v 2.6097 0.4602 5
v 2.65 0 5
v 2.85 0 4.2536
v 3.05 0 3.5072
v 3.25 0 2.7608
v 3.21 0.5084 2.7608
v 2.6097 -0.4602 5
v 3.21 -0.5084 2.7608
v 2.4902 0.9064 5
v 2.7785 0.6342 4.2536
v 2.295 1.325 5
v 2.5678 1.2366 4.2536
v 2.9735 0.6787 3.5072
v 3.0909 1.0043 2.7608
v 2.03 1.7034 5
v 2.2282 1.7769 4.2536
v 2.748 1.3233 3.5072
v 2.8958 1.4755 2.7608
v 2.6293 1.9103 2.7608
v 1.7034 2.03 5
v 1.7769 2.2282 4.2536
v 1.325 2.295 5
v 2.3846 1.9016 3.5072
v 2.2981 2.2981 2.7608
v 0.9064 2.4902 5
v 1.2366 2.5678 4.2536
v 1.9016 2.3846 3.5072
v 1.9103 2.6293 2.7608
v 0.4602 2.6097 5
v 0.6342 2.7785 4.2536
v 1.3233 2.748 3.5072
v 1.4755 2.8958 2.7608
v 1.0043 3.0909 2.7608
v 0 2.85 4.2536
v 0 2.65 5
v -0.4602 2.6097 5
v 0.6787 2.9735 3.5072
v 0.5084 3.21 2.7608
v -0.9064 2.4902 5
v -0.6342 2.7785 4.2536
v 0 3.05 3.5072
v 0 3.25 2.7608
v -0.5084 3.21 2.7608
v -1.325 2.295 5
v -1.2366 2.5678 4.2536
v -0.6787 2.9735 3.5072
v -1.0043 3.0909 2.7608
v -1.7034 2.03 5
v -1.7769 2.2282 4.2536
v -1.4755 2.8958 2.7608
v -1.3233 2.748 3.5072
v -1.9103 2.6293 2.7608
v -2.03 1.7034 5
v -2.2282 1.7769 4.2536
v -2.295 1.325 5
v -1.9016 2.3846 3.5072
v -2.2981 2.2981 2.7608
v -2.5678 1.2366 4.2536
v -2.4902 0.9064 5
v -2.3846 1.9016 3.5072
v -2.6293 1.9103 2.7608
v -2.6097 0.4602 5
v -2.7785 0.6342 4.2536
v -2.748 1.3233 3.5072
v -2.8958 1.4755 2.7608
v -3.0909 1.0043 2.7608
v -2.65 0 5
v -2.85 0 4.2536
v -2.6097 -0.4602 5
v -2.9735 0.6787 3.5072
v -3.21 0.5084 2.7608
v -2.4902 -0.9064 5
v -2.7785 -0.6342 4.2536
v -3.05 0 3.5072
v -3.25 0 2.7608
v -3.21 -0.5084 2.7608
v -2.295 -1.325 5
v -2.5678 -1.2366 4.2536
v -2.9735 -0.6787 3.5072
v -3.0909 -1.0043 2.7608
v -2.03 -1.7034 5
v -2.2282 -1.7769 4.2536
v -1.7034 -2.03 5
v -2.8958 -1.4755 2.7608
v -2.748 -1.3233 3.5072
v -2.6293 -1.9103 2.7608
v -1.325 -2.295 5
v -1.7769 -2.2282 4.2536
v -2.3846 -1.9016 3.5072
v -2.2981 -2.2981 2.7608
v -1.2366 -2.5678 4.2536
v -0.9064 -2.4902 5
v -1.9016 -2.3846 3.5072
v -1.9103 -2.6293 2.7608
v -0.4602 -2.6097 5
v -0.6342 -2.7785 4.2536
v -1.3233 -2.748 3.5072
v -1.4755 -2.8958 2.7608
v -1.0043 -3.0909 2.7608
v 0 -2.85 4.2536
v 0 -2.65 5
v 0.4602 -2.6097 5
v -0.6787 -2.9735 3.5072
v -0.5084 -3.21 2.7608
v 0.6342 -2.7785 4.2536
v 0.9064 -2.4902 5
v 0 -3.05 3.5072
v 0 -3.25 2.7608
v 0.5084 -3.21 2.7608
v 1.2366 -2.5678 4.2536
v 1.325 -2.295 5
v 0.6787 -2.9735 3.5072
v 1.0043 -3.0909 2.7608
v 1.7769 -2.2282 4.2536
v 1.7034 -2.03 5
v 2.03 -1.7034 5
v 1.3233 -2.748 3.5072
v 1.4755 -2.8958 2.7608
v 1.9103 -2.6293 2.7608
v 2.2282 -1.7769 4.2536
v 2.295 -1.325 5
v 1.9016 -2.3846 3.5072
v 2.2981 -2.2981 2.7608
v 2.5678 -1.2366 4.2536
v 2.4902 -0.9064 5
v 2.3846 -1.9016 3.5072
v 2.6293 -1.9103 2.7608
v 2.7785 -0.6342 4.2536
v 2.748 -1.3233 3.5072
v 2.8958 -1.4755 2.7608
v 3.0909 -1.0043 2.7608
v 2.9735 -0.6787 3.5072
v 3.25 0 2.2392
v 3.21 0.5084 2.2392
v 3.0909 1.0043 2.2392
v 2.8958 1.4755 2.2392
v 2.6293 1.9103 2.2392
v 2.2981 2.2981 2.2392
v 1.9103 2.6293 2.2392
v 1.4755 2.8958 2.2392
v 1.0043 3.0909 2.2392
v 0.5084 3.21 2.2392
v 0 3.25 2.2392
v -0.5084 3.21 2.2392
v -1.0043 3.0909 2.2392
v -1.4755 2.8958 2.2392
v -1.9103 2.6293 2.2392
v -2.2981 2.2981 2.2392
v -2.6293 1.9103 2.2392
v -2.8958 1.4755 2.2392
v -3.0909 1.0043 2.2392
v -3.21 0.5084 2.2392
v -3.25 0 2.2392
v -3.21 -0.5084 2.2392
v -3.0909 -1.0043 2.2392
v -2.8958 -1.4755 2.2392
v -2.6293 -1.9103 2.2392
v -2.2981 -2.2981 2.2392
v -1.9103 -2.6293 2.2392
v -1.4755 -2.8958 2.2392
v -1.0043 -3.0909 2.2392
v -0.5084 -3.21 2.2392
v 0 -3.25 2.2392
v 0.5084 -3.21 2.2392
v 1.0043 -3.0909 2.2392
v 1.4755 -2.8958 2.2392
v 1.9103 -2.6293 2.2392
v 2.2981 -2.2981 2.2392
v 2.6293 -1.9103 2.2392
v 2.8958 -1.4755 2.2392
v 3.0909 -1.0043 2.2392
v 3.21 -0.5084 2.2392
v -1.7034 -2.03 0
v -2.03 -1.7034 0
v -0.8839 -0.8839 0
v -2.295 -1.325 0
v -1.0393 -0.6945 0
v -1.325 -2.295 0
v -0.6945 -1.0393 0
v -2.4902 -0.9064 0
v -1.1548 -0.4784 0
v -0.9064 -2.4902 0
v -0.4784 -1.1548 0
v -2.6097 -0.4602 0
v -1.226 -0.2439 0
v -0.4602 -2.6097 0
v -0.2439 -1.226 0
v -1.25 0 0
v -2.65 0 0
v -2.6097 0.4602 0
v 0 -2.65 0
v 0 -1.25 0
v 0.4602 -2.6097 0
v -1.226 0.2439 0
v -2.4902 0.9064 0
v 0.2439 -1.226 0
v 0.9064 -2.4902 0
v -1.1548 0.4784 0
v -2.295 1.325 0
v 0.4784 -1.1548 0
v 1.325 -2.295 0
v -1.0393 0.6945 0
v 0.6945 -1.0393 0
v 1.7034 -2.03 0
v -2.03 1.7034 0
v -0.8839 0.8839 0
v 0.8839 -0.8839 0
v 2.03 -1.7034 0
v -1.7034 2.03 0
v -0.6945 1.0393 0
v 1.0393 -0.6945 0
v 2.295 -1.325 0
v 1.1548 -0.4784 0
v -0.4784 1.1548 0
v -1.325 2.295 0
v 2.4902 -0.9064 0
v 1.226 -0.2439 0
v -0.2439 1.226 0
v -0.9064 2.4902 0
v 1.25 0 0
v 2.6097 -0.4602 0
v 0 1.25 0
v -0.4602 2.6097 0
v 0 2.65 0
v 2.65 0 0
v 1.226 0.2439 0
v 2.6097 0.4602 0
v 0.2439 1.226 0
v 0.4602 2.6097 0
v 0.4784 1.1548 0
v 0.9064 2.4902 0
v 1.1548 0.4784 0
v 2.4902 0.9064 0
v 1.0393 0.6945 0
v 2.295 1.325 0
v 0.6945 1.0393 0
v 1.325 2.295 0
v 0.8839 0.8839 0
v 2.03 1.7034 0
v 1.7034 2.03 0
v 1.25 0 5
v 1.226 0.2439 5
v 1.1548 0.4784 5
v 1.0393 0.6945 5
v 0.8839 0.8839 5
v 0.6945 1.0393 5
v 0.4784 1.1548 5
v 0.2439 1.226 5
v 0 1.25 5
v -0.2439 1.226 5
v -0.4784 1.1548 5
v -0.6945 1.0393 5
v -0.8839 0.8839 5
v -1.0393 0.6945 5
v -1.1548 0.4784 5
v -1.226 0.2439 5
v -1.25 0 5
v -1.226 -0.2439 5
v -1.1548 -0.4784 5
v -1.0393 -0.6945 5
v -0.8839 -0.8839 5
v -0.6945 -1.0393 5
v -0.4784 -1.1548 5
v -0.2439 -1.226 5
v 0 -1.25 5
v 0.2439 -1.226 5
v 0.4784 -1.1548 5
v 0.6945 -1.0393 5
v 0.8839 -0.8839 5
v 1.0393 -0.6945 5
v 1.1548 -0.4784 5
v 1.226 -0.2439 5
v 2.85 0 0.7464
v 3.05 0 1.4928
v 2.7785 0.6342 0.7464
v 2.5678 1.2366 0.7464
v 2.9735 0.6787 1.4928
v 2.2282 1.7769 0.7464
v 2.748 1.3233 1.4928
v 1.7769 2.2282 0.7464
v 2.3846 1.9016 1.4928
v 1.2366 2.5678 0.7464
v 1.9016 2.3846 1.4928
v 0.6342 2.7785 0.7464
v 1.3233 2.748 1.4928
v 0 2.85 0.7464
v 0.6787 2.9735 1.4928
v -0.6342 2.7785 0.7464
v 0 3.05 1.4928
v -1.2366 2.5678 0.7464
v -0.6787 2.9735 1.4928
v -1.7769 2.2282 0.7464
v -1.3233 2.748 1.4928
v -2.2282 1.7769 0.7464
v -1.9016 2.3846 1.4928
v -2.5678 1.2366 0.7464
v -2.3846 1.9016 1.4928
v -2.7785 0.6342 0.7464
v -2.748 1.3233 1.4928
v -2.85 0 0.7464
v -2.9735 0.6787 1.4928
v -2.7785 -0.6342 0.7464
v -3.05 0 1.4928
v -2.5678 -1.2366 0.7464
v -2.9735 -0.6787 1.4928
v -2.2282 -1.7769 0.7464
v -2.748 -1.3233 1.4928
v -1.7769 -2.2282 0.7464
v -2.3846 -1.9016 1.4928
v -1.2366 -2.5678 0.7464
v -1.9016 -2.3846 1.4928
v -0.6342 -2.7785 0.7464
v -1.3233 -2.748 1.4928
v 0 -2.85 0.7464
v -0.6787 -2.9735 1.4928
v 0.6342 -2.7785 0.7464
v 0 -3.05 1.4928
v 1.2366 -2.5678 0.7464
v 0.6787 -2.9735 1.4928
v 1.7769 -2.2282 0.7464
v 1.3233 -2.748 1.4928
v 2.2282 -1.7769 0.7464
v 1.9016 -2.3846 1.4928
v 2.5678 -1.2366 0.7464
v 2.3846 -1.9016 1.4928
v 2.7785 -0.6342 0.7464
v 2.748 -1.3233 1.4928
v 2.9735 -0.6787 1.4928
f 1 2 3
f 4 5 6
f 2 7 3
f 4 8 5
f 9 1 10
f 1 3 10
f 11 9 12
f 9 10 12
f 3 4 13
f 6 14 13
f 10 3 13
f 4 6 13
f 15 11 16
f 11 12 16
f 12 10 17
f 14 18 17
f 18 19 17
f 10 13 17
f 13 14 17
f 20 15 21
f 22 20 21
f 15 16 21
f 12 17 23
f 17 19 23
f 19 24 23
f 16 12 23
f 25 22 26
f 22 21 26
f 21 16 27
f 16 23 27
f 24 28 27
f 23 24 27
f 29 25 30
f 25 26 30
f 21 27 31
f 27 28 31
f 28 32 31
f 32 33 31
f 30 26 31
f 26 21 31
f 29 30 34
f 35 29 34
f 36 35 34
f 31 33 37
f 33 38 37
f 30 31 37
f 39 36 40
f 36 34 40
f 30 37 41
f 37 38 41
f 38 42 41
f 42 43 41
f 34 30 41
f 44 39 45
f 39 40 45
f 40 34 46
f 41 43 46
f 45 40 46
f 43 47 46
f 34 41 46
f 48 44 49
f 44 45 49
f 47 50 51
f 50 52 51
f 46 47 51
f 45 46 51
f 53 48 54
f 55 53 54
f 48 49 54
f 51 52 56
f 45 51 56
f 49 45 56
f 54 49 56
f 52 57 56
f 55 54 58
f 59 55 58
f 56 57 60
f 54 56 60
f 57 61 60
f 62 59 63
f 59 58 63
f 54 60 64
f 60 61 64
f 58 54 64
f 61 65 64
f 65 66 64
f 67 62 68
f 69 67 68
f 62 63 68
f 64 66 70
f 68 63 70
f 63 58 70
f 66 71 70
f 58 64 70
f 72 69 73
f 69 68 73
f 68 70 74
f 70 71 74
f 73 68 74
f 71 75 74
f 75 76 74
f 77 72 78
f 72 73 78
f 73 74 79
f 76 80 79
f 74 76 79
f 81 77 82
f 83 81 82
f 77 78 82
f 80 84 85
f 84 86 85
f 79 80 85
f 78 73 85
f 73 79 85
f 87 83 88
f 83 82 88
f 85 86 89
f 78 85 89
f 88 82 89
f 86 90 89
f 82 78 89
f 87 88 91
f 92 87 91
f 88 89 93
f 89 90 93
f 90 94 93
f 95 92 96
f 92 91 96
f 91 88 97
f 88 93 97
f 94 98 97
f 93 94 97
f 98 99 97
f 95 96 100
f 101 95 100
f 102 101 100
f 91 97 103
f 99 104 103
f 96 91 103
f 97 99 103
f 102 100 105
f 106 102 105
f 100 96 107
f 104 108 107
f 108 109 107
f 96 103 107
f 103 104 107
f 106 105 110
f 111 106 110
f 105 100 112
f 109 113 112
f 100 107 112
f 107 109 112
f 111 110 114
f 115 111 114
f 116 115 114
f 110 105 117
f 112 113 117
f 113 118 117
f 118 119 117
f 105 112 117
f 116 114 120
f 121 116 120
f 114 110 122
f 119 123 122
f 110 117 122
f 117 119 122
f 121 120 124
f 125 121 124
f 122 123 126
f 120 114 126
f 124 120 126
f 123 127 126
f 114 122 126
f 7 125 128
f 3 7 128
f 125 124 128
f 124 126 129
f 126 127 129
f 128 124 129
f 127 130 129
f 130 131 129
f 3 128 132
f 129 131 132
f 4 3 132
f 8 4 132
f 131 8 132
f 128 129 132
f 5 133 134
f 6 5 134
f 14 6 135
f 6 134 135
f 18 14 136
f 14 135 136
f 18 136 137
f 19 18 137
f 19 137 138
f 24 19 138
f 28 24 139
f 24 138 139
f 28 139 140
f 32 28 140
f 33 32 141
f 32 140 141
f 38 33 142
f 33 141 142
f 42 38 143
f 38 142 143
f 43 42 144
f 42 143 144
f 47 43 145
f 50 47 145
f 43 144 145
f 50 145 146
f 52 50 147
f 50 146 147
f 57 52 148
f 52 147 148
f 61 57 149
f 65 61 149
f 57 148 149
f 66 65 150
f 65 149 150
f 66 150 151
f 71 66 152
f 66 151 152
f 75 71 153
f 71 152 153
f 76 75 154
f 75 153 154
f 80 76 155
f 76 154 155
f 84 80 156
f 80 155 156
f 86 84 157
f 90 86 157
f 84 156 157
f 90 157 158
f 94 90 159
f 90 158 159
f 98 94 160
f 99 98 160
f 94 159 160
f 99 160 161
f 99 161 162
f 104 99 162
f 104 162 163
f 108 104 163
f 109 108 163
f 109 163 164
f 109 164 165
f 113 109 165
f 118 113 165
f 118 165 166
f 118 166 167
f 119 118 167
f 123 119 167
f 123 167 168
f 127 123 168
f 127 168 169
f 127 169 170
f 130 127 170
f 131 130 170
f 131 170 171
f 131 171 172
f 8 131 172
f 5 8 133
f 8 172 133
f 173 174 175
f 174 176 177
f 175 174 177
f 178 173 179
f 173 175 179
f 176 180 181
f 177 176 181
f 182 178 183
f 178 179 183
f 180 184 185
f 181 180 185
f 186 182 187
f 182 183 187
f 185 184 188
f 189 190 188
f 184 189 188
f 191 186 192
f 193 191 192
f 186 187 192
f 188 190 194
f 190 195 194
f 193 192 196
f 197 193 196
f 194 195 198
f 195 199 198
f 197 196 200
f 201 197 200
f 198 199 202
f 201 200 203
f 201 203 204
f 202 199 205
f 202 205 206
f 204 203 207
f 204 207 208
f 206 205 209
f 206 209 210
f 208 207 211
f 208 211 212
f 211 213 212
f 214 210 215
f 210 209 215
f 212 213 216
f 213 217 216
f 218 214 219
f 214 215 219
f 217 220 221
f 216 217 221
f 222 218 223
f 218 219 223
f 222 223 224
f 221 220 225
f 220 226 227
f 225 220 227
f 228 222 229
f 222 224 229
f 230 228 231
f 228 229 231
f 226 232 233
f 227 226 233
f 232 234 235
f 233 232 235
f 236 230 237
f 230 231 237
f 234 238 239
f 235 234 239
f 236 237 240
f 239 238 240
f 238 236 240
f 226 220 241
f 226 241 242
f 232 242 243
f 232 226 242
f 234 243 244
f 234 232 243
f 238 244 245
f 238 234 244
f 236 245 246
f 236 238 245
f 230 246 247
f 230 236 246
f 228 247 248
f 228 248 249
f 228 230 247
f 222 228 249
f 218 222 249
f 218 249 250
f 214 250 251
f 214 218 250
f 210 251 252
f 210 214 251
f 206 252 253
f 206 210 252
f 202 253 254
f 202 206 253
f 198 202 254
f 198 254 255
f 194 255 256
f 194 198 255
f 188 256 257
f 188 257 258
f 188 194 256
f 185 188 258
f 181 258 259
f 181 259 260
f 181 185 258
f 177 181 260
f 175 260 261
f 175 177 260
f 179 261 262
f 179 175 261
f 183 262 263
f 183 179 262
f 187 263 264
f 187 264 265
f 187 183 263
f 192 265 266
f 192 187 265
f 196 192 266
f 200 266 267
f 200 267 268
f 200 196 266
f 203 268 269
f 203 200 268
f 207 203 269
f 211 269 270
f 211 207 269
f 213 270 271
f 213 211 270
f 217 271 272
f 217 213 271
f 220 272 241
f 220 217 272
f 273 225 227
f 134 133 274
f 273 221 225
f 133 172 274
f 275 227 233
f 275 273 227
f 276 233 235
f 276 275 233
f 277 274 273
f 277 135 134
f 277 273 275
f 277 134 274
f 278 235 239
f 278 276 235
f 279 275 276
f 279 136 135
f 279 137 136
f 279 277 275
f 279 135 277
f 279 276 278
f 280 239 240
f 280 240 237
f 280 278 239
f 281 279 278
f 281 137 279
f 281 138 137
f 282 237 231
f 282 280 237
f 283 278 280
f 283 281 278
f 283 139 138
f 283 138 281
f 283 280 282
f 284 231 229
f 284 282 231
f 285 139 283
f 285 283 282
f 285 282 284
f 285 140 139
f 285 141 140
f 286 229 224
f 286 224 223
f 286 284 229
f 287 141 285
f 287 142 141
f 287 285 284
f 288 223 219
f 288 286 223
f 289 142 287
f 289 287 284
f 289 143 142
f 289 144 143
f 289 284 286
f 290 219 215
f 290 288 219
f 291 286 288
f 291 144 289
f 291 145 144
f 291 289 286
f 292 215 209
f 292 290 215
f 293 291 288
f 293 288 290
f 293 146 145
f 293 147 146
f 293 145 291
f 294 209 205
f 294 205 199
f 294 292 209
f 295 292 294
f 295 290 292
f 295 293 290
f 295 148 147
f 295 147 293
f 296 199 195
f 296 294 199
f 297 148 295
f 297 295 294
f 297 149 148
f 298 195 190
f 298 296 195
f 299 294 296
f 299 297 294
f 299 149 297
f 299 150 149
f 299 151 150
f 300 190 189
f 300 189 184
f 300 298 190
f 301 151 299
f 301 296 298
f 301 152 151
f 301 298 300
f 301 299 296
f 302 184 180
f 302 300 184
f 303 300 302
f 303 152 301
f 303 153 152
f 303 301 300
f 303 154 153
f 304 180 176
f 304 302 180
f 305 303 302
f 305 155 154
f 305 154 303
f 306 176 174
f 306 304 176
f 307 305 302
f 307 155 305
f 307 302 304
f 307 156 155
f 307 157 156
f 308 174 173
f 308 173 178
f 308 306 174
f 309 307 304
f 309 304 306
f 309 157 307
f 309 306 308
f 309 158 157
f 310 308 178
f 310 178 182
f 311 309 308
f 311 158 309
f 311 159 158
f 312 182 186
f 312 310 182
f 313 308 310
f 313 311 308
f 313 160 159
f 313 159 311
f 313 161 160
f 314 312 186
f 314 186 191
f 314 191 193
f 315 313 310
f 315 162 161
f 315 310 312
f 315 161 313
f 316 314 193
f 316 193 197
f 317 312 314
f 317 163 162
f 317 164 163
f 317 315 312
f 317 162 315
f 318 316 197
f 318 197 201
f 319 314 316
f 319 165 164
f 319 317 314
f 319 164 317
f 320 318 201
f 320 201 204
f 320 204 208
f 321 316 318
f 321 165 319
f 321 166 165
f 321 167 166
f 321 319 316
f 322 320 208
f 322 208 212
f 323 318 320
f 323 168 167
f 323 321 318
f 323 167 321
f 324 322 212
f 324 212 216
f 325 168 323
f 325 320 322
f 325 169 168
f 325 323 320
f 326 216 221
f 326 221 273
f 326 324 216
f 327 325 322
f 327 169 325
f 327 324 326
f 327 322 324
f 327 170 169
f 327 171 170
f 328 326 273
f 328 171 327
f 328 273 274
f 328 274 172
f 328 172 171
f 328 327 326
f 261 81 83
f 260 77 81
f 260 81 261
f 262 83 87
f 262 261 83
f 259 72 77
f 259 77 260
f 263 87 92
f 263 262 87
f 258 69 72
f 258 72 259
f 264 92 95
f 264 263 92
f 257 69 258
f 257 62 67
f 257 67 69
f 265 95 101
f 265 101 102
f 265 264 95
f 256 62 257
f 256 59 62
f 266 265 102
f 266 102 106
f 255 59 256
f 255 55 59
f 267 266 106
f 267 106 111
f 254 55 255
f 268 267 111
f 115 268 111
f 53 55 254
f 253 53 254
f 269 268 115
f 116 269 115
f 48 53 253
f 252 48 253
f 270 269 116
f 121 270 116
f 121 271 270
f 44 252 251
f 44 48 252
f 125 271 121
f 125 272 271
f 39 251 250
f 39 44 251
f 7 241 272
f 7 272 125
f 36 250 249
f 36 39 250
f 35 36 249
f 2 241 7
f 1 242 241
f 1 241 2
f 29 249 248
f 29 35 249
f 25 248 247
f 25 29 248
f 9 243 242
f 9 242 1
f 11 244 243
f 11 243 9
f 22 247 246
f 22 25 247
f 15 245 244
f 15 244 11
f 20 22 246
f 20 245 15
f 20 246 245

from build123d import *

# Parameters (mm, degrees)
F0_R       = 3.25
F0_R_2     = 2.9
F0_R_3     = 1.25
F1_DEPTH   = 5
F2_SIZE2   = 2.2392304845
F2_SIZE    = 0.6
F2_2_SIZE2 = 2.2392304845
F2_2_SIZE  = 0.6


with BuildPart() as f1:
    # F0 (on Top) → F1 (new body)
    with BuildSketch(Plane.XY):
        Circle(F0_R)
        Circle(F0_R_2, mode=Mode.SUBTRACT)
        Circle(F0_R_2)
        Circle(F0_R_3, mode=Mode.SUBTRACT)
    extrude(amount=F1_DEPTH)

    # F2
    f2_edges = [f1.edges().sort_by_distance(p)[0] for p in [
        (-3.25, 0, 5),
    ]]
    f2_side = f1.faces().sort_by_distance((-1.341924, 0, 5))[0]
    chamfer(f2_edges, length=F2_SIZE, length2=F2_SIZE2, reference=f2_side)

    # F2#2
    f2_2_edges = [f1.edges().sort_by_distance(p)[0] for p in [
        (-3.25, 0, 0),
    ]]
    f2_2_side = f1.faces().sort_by_distance((-1.341924, 0, 0))[0]
    chamfer(f2_2_edges, length=F2_2_SIZE, length2=F2_2_SIZE2, reference=f2_2_side)


solid = f1.part
